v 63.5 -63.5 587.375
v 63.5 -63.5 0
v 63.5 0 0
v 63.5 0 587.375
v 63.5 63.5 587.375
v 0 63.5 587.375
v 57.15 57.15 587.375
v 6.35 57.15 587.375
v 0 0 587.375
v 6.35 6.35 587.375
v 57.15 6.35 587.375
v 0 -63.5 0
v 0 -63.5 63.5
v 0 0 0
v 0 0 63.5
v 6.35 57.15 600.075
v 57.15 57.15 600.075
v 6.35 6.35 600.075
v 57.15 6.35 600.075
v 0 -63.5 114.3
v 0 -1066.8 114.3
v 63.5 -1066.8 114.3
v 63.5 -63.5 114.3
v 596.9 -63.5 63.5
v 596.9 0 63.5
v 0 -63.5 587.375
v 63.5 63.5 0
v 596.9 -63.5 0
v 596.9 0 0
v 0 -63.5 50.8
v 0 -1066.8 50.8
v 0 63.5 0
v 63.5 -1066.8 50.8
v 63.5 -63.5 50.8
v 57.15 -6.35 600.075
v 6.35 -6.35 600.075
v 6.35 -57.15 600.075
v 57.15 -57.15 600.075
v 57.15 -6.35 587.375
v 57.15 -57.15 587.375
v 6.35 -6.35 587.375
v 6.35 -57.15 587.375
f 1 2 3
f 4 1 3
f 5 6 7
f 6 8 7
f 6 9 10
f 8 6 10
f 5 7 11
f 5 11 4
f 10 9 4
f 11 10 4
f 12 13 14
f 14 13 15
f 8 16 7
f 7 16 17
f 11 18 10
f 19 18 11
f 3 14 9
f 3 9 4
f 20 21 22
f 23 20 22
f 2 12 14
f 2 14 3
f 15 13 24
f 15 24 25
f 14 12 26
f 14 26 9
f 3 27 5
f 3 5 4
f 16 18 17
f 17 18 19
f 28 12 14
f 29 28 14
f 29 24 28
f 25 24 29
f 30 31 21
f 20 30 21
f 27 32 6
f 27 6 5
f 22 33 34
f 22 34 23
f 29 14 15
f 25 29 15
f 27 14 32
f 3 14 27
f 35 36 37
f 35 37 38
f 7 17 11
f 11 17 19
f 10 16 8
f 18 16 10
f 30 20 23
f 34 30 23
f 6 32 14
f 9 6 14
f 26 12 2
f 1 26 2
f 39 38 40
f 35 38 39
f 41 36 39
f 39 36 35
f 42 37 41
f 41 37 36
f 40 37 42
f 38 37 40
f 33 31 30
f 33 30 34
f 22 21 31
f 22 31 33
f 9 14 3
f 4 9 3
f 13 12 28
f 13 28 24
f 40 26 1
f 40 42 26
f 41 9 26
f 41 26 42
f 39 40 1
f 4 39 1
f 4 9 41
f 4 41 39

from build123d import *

# Parameters (mm, degrees)
F0_W     = 63.5
F0_H     = 63.5
F1_DEPTH = 600.075
F2_W     = 63.5
F2_H     = 63.5
F2_W_2   = 50.8
F2_H_2   = 50.8
F3_DEPTH = 12.7
F4_W     = 63.5
F4_H     = 63.5
F5_DEPTH = 501.65
F7_W     = 63.5
F7_H     = 63.5
F8_DEPTH = 298.45


with BuildPart() as f1:
    # F0 (on Top) → F1 (new body)
    with BuildSketch(Plane.XY):
        with Locations((31.75, -31.75)):
            Rectangle(F0_W, F0_H)
    extrude(amount=F1_DEPTH)

    # F2 (on face) → F3 (cut)
    with BuildSketch(Plane.XY.offset(600.075)):
        with Locations((31.75, -31.75)):
            Rectangle(F2_W, F2_H)
        with Locations((31.75, -31.75)):
            Rectangle(F2_W_2, F2_H_2, mode=Mode.SUBTRACT)
    extrude(amount=-F3_DEPTH, mode=Mode.SUBTRACT)


with BuildPart() as f5:
    # F4 (on face) → F5 (new body)
    with BuildSketch(Plane.XZ.offset(63.5)):
        with Locations((31.75, 82.55)):
            Rectangle(F4_W, F4_H)
    extrude(amount=F5_DEPTH)

    # F6: F5 across face


with BuildPart() as f5_1:
    add(f5.part)
    add(f5.part.mirror(Plane(origin=(31.75, -565.15, 82.55), x_dir=(1, 0, 0), z_dir=(0, -1, 0))))


with BuildPart() as f8:
    # F7 (on Right) → F8 (new body)
    with BuildSketch(Plane.YZ):
        with Locations((-31.75, 31.75)):
            Rectangle(F7_W, F7_H)
    extrude(amount=F8_DEPTH)

    # F9: F8 across face


with BuildPart() as f8_1:
    add(f8.part)
    add(f8.part.mirror(Plane(origin=(298.45, -31.75, 31.75), x_dir=(0, 1, 0), z_dir=(1, 0, 0))))


with BuildPart() as f10_1:
    # F10: instance of F1
    add(f1.part.mirror(Plane.XZ))


solid = Compound([f1.part, f5_1.part, f8_1.part, f10_1.part])
